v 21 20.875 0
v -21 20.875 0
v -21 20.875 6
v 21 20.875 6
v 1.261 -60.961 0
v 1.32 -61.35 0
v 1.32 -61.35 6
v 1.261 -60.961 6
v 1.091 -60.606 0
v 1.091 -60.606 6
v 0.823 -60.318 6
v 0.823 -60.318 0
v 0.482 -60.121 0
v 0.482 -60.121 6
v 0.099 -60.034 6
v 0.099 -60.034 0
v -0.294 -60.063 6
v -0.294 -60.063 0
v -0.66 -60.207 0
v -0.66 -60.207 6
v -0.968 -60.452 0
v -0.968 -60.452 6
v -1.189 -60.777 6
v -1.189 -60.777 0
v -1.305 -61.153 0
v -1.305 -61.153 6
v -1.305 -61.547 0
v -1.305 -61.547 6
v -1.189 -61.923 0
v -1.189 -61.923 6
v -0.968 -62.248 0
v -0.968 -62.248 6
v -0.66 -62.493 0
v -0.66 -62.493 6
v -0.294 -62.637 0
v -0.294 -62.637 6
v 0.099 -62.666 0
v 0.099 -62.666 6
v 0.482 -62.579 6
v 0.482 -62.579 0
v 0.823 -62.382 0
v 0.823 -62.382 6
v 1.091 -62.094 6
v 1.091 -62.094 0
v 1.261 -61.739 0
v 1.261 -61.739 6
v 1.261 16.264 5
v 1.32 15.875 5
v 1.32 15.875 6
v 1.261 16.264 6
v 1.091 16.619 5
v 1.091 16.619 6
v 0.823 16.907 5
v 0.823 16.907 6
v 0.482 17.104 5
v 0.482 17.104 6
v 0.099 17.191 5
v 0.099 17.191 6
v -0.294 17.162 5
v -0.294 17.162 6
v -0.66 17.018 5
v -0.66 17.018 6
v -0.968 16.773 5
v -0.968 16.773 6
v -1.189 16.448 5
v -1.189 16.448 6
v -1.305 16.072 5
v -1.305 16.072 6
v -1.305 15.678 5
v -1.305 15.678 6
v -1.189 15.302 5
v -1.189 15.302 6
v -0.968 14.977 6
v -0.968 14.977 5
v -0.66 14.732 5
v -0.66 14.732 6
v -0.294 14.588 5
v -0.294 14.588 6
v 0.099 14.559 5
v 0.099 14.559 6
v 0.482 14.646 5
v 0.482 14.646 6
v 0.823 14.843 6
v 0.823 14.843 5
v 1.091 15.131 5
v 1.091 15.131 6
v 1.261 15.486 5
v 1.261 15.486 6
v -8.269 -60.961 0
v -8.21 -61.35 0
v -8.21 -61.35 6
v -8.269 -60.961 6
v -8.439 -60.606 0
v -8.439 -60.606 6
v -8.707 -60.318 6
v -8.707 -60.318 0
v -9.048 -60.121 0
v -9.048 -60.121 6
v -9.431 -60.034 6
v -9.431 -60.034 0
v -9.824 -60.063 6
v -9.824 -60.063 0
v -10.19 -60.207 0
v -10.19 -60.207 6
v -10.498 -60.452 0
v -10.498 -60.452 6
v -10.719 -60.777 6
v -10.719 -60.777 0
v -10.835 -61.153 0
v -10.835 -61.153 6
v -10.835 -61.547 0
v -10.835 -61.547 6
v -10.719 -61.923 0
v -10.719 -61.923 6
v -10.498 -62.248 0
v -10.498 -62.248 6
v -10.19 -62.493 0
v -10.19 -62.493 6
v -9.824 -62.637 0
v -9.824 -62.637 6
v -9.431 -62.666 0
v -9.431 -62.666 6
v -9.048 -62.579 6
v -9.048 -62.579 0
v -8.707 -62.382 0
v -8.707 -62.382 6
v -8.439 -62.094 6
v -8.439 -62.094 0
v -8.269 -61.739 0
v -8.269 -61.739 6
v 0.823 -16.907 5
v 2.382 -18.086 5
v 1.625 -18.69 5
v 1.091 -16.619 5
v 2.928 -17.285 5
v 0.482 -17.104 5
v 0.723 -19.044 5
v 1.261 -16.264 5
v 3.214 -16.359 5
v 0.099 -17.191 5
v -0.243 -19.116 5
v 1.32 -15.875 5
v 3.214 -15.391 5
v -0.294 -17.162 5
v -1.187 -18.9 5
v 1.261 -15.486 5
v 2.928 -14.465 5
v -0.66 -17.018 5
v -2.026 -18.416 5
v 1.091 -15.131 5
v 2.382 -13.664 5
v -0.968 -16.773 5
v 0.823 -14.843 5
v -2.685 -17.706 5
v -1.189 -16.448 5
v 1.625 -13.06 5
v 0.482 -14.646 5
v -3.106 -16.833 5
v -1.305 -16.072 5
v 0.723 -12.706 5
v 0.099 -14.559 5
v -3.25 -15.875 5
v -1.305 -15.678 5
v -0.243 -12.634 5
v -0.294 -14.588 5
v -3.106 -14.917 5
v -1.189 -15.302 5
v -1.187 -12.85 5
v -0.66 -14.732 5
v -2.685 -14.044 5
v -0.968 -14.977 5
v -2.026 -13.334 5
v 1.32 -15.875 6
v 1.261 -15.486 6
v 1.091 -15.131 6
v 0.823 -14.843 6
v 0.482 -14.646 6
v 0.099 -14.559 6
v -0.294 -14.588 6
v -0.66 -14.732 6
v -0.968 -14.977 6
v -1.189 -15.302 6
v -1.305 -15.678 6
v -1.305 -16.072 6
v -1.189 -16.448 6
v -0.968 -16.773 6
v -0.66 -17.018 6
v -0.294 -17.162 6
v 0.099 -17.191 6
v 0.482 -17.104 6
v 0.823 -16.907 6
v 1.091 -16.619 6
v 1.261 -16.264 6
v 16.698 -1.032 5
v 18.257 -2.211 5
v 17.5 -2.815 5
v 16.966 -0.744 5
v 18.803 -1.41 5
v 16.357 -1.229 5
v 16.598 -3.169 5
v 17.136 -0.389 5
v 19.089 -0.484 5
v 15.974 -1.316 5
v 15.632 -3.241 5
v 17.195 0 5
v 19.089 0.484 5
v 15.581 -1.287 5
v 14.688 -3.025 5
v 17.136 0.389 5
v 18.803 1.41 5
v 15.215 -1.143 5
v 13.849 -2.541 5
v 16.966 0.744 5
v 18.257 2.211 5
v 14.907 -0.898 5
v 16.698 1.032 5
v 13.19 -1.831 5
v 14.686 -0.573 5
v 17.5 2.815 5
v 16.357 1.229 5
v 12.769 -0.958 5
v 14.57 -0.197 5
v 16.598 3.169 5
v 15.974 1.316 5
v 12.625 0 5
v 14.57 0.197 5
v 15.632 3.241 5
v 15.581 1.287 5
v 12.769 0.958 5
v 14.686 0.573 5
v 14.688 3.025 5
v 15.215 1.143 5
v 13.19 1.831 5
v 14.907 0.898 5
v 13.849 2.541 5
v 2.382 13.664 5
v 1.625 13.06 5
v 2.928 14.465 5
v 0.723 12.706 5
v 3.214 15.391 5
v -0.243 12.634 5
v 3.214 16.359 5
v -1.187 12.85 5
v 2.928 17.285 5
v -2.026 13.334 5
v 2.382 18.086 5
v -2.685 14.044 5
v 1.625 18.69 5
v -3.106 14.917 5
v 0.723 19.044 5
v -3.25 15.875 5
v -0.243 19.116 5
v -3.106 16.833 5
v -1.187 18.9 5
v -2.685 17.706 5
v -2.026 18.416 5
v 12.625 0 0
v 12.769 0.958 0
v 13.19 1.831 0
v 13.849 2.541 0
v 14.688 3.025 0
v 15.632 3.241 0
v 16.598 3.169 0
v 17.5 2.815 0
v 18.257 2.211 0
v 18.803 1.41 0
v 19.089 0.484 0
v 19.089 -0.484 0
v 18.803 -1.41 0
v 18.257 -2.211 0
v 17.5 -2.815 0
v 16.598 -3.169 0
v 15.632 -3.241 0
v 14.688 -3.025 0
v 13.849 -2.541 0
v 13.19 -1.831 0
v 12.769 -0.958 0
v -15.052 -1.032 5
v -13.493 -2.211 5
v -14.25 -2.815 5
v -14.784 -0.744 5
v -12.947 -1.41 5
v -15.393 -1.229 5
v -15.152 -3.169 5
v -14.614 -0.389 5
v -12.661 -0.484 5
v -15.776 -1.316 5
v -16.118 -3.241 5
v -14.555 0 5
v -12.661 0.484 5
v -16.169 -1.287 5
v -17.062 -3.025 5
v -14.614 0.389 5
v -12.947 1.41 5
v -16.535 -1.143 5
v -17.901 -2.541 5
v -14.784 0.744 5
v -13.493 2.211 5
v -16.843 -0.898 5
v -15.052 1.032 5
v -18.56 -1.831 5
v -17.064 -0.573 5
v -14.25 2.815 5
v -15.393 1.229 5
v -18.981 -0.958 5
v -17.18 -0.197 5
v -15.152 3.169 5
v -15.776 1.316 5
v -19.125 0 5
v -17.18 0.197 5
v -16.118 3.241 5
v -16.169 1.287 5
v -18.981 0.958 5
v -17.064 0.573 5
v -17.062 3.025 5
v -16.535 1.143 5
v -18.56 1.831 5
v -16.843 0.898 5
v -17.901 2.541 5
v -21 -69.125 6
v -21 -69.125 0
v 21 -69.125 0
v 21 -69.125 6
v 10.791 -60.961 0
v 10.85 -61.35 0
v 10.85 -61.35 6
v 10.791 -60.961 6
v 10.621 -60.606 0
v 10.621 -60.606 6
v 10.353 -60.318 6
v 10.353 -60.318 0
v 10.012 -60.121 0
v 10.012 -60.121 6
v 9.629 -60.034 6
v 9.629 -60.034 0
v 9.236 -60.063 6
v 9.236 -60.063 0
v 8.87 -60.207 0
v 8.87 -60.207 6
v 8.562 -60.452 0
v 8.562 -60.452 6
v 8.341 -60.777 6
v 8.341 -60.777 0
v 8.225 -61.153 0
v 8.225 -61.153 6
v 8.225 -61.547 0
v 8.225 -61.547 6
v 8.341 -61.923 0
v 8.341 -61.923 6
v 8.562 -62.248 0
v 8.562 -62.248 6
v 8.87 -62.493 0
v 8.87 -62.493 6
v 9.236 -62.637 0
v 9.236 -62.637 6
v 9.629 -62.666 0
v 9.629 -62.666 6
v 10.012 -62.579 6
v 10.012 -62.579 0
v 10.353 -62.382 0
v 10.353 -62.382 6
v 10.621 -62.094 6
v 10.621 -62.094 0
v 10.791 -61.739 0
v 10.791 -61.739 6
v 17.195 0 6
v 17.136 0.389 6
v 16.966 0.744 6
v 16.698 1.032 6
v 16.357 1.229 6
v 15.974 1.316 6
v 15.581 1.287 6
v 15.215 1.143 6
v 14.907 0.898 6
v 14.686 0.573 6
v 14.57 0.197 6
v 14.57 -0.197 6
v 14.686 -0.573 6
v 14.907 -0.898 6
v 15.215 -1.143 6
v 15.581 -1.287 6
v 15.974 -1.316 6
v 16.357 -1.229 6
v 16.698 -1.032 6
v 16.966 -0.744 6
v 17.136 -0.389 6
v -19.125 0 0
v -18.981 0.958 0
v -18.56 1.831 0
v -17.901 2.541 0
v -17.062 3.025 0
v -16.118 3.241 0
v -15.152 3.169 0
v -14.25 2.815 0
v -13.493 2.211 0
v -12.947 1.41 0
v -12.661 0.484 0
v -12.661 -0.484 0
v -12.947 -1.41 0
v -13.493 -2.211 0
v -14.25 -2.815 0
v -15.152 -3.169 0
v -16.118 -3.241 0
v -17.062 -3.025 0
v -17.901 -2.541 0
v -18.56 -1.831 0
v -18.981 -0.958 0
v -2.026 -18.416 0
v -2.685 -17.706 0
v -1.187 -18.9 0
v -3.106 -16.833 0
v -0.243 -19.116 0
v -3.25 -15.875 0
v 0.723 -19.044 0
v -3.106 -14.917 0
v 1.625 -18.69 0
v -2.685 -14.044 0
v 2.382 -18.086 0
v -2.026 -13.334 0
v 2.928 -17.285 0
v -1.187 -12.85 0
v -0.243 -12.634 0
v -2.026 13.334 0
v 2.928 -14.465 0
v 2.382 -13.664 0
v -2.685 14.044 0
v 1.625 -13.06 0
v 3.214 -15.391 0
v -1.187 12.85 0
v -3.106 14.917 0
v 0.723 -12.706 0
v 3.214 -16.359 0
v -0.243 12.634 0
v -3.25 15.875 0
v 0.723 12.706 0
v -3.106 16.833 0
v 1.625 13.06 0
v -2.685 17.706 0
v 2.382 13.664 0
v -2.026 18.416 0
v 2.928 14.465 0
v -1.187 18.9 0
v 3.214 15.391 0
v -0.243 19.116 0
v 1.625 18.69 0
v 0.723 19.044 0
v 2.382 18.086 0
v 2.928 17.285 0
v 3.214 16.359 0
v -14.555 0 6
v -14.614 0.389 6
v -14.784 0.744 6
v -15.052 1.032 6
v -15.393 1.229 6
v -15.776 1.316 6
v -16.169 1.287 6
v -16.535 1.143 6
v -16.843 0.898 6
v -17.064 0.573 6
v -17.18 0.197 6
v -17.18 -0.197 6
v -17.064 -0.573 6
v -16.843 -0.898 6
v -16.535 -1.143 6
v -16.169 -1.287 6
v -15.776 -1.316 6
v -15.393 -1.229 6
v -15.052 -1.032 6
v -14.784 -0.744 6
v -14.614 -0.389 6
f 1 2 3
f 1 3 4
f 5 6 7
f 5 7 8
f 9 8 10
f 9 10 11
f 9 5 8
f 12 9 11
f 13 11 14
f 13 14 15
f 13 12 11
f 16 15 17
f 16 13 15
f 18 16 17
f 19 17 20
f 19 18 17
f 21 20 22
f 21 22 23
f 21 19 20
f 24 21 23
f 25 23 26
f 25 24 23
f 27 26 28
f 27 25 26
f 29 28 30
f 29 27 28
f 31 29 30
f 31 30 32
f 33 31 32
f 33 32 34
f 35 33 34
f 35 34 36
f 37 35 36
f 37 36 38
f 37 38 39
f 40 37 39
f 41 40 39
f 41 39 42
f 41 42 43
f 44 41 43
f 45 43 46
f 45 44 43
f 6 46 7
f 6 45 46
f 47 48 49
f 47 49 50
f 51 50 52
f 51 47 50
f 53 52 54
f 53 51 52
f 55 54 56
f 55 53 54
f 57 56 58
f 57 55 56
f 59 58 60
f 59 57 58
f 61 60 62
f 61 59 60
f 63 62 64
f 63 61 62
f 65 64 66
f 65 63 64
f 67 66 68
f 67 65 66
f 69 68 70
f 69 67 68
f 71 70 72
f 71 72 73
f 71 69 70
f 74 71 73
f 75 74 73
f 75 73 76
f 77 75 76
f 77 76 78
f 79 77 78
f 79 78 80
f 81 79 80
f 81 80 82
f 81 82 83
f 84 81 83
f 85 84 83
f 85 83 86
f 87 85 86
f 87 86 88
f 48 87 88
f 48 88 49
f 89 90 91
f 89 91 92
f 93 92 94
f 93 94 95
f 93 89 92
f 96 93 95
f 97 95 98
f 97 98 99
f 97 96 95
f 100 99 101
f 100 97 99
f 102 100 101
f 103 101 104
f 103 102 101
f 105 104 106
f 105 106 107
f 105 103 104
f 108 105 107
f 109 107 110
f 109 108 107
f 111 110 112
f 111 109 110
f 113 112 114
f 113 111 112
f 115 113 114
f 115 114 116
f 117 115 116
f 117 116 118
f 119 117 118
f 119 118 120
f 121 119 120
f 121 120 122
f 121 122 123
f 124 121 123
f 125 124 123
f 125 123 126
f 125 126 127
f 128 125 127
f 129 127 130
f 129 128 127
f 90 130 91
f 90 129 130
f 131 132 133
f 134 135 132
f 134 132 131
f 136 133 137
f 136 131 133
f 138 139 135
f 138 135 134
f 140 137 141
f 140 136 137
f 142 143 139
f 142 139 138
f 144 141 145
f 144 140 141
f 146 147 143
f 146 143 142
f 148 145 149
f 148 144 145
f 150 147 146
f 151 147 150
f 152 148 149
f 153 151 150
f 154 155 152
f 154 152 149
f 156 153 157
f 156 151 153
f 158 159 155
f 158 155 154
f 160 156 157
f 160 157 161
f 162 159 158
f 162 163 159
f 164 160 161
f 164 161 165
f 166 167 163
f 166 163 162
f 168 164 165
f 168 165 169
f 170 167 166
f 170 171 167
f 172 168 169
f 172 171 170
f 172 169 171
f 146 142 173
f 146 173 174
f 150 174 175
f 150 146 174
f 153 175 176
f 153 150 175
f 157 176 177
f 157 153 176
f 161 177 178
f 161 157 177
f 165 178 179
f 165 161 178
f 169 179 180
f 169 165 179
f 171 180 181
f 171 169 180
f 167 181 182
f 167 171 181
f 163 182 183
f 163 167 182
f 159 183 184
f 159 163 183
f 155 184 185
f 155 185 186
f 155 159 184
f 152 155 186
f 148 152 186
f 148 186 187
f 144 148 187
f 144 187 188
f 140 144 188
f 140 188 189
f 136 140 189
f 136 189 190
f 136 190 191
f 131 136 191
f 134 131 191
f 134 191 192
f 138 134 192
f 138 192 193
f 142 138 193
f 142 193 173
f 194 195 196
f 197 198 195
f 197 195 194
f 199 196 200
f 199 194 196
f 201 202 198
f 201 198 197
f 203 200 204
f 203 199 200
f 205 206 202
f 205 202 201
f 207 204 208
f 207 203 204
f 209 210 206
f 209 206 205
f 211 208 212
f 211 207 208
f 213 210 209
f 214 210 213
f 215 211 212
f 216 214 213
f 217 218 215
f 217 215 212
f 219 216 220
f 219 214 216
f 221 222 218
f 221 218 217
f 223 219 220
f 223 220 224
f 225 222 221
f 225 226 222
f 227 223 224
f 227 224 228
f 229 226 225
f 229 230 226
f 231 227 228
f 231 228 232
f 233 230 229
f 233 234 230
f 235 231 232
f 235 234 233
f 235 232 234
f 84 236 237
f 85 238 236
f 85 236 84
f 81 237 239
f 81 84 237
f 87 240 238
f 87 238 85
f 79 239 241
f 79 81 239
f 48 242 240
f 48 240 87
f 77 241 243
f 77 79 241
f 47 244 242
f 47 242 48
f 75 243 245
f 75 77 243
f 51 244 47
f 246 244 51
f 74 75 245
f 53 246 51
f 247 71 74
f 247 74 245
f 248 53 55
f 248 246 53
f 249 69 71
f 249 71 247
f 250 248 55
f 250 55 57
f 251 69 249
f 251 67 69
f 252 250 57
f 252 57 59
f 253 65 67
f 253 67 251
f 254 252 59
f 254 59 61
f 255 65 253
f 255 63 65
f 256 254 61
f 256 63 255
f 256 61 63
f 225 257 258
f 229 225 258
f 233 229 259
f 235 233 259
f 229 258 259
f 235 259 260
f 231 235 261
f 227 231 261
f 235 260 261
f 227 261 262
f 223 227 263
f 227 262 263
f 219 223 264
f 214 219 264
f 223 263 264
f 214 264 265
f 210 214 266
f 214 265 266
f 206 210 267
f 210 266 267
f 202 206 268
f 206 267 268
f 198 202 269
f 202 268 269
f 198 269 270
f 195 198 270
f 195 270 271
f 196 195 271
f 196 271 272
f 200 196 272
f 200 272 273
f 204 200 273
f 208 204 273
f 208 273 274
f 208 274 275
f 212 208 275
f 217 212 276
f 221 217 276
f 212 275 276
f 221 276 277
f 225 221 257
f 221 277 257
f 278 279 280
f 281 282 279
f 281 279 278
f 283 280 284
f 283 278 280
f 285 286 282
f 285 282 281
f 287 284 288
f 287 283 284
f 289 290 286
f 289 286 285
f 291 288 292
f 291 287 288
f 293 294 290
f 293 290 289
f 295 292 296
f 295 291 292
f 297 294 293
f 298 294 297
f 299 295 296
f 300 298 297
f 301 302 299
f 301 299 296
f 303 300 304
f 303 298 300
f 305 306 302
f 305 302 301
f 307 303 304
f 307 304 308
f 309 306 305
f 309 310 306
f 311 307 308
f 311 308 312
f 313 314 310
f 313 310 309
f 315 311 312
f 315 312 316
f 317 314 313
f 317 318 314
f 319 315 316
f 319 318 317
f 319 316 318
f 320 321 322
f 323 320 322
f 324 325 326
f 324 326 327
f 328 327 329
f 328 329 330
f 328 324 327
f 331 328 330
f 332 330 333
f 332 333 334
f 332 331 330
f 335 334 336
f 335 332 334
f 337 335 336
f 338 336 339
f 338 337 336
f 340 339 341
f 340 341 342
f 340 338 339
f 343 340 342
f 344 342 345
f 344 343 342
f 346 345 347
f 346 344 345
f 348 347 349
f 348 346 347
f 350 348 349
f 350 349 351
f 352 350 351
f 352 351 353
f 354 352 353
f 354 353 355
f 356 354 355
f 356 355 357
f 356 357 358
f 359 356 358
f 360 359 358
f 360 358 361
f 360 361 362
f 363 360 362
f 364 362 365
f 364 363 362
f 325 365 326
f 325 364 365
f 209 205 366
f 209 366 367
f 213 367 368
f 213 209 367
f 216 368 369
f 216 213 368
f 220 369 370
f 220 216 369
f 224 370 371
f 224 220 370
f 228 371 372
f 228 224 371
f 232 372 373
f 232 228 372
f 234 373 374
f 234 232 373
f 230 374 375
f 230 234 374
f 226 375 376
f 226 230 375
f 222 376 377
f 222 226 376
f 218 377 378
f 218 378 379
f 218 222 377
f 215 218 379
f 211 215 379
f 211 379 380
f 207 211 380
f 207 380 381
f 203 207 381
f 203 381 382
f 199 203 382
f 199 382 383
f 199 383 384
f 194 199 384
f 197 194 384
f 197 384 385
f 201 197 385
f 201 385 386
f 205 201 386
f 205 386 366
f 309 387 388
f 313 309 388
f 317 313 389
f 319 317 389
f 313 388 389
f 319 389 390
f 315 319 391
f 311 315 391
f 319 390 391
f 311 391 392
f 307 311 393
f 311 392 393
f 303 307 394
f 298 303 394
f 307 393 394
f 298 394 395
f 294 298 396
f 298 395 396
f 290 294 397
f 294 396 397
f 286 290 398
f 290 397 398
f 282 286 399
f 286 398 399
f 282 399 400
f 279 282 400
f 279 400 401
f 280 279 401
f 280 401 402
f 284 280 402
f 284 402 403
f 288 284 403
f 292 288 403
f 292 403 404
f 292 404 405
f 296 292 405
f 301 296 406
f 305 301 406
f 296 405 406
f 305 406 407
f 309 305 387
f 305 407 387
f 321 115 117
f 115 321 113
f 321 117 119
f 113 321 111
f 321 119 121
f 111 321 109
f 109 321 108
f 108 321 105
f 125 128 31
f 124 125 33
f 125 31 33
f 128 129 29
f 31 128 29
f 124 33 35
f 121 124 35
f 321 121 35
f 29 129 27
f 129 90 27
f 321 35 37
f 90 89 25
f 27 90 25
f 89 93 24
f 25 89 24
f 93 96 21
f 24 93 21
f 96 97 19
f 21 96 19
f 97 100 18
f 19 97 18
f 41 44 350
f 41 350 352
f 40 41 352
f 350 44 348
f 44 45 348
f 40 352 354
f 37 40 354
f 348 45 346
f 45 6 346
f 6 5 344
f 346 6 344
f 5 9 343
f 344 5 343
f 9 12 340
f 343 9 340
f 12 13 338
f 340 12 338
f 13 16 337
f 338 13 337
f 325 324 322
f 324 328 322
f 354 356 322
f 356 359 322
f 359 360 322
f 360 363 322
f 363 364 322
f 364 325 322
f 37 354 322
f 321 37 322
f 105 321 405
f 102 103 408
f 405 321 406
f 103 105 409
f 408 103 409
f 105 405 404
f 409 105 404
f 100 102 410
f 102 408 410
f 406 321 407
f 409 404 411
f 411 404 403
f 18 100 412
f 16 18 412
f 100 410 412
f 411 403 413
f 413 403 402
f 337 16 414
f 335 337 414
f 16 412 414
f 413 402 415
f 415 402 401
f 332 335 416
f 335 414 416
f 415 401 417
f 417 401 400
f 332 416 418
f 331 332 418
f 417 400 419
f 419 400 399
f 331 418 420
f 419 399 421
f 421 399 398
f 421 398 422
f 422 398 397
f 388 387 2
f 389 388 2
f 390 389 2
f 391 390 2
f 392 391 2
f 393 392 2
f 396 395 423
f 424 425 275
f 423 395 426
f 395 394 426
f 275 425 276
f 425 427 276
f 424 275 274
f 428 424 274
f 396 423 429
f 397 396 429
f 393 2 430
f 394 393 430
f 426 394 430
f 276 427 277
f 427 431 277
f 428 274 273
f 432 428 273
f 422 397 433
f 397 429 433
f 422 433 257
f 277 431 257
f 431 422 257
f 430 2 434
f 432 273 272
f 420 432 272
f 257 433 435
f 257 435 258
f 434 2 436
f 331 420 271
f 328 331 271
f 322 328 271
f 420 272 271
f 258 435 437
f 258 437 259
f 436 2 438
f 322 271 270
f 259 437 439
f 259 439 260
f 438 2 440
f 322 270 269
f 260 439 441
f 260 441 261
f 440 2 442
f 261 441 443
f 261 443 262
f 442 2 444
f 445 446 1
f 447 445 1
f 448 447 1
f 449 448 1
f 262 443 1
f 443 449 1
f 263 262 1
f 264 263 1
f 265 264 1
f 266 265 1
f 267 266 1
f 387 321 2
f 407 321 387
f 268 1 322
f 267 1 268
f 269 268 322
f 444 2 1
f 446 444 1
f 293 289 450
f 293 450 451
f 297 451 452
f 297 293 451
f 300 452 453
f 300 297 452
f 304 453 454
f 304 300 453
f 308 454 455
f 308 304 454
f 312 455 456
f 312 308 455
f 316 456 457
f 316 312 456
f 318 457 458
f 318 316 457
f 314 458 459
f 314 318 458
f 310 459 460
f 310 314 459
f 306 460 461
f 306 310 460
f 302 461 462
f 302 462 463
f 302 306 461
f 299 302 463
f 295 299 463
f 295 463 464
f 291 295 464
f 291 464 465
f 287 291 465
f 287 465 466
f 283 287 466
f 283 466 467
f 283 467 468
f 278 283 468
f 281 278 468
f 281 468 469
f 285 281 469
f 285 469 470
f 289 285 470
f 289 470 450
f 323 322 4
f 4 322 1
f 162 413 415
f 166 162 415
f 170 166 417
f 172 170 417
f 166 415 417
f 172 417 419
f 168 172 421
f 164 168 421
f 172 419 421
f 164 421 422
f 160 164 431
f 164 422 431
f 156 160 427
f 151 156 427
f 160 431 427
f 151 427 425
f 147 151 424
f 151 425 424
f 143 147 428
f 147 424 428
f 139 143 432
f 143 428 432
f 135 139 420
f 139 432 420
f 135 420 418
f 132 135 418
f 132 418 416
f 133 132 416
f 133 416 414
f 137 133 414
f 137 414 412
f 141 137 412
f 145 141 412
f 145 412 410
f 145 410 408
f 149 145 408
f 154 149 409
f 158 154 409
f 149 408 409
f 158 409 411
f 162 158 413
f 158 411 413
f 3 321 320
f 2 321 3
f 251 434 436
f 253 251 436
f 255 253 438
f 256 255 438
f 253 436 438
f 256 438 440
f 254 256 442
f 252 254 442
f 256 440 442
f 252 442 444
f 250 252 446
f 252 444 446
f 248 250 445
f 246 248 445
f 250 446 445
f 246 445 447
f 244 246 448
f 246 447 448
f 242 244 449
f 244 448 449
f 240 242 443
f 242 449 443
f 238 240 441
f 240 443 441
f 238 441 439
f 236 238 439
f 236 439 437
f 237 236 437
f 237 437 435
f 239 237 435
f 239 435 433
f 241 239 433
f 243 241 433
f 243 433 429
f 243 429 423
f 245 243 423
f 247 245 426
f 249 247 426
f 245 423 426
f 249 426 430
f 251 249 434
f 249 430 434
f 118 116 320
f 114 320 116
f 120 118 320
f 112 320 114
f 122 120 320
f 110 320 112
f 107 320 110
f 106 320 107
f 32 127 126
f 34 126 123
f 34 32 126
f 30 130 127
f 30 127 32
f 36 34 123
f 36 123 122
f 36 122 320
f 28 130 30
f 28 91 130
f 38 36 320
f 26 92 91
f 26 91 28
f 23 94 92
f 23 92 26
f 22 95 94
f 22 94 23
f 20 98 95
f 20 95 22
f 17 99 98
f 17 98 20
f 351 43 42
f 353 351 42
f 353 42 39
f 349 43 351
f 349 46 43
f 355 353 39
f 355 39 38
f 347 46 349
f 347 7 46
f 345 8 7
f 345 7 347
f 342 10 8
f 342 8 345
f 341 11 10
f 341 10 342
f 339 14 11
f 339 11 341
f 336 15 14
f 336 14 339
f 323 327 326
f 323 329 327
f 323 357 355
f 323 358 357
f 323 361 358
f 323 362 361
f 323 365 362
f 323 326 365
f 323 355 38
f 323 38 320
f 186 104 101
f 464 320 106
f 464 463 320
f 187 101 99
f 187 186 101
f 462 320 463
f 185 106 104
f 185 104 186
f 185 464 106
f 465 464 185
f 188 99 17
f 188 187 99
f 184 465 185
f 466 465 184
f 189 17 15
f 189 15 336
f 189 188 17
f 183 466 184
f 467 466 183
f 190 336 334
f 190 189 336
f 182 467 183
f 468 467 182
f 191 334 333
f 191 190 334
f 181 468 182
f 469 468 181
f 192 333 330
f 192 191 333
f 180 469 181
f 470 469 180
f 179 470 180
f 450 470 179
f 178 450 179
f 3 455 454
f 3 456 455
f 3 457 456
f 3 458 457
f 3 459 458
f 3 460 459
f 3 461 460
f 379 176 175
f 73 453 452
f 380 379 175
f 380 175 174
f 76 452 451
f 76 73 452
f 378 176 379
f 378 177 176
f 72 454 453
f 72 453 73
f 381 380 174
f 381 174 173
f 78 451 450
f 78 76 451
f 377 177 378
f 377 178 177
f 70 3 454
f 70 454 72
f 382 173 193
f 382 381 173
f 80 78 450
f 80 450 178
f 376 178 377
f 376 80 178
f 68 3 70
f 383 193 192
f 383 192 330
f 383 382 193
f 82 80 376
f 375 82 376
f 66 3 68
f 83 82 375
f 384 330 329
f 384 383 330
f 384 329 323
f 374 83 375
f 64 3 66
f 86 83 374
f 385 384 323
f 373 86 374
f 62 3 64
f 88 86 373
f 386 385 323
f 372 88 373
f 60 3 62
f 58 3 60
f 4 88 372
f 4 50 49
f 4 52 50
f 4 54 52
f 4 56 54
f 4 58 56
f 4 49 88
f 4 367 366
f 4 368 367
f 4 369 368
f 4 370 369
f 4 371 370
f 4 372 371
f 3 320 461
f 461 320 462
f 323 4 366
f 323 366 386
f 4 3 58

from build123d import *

# Parameters (mm, degrees)
SKETCH1_W           = 42
SKETCH1_H           = 90
SKETCH1_R           = 1.32
BOSS_EXTRUDE1_DEPTH = 6
SKETCH2_R           = 3.25
CUT_EXTRUDE1_DEPTH  = 5


with BuildPart() as part:
    # Sketch1 → Boss-Extrude1 (new body)
    with BuildSketch(Plane.XY):
        with Locations((0, -24.125)):
            Rectangle(SKETCH1_W, SKETCH1_H)
        with Locations((0, -15.875)):
            Circle(SKETCH1_R, mode=Mode.SUBTRACT)
        with Locations((-15.875, 0)):
            Circle(SKETCH1_R, mode=Mode.SUBTRACT)
        with Locations((0, 15.875)):
            Circle(SKETCH1_R, mode=Mode.SUBTRACT)
        with Locations((-9.53, -61.35)):
            Circle(SKETCH1_R, mode=Mode.SUBTRACT)
        with Locations((0, -61.35)):
            Circle(SKETCH1_R, mode=Mode.SUBTRACT)
        with Locations((9.53, -61.35)):
            Circle(SKETCH1_R, mode=Mode.SUBTRACT)
        with Locations((15.875, 0)):
            Circle(SKETCH1_R, mode=Mode.SUBTRACT)
    extrude(amount=BOSS_EXTRUDE1_DEPTH)

    # Sketch2 → Cut-Extrude1 (cut)
    with BuildSketch(Plane(origin=(0, 0, 0), x_dir=(-1, 0, 0), z_dir=(0, 0, -1))):
        with Locations((-15.875, 0)):
            Circle(SKETCH2_R)
        with Locations((0, 15.875)):
            Circle(SKETCH2_R)
        with Locations((15.875, 0)):
            Circle(SKETCH2_R)
        with Locations((0, -15.875)):
            Circle(SKETCH2_R)
    extrude(amount=-CUT_EXTRUDE1_DEPTH, mode=Mode.SUBTRACT)


solid = part.part
